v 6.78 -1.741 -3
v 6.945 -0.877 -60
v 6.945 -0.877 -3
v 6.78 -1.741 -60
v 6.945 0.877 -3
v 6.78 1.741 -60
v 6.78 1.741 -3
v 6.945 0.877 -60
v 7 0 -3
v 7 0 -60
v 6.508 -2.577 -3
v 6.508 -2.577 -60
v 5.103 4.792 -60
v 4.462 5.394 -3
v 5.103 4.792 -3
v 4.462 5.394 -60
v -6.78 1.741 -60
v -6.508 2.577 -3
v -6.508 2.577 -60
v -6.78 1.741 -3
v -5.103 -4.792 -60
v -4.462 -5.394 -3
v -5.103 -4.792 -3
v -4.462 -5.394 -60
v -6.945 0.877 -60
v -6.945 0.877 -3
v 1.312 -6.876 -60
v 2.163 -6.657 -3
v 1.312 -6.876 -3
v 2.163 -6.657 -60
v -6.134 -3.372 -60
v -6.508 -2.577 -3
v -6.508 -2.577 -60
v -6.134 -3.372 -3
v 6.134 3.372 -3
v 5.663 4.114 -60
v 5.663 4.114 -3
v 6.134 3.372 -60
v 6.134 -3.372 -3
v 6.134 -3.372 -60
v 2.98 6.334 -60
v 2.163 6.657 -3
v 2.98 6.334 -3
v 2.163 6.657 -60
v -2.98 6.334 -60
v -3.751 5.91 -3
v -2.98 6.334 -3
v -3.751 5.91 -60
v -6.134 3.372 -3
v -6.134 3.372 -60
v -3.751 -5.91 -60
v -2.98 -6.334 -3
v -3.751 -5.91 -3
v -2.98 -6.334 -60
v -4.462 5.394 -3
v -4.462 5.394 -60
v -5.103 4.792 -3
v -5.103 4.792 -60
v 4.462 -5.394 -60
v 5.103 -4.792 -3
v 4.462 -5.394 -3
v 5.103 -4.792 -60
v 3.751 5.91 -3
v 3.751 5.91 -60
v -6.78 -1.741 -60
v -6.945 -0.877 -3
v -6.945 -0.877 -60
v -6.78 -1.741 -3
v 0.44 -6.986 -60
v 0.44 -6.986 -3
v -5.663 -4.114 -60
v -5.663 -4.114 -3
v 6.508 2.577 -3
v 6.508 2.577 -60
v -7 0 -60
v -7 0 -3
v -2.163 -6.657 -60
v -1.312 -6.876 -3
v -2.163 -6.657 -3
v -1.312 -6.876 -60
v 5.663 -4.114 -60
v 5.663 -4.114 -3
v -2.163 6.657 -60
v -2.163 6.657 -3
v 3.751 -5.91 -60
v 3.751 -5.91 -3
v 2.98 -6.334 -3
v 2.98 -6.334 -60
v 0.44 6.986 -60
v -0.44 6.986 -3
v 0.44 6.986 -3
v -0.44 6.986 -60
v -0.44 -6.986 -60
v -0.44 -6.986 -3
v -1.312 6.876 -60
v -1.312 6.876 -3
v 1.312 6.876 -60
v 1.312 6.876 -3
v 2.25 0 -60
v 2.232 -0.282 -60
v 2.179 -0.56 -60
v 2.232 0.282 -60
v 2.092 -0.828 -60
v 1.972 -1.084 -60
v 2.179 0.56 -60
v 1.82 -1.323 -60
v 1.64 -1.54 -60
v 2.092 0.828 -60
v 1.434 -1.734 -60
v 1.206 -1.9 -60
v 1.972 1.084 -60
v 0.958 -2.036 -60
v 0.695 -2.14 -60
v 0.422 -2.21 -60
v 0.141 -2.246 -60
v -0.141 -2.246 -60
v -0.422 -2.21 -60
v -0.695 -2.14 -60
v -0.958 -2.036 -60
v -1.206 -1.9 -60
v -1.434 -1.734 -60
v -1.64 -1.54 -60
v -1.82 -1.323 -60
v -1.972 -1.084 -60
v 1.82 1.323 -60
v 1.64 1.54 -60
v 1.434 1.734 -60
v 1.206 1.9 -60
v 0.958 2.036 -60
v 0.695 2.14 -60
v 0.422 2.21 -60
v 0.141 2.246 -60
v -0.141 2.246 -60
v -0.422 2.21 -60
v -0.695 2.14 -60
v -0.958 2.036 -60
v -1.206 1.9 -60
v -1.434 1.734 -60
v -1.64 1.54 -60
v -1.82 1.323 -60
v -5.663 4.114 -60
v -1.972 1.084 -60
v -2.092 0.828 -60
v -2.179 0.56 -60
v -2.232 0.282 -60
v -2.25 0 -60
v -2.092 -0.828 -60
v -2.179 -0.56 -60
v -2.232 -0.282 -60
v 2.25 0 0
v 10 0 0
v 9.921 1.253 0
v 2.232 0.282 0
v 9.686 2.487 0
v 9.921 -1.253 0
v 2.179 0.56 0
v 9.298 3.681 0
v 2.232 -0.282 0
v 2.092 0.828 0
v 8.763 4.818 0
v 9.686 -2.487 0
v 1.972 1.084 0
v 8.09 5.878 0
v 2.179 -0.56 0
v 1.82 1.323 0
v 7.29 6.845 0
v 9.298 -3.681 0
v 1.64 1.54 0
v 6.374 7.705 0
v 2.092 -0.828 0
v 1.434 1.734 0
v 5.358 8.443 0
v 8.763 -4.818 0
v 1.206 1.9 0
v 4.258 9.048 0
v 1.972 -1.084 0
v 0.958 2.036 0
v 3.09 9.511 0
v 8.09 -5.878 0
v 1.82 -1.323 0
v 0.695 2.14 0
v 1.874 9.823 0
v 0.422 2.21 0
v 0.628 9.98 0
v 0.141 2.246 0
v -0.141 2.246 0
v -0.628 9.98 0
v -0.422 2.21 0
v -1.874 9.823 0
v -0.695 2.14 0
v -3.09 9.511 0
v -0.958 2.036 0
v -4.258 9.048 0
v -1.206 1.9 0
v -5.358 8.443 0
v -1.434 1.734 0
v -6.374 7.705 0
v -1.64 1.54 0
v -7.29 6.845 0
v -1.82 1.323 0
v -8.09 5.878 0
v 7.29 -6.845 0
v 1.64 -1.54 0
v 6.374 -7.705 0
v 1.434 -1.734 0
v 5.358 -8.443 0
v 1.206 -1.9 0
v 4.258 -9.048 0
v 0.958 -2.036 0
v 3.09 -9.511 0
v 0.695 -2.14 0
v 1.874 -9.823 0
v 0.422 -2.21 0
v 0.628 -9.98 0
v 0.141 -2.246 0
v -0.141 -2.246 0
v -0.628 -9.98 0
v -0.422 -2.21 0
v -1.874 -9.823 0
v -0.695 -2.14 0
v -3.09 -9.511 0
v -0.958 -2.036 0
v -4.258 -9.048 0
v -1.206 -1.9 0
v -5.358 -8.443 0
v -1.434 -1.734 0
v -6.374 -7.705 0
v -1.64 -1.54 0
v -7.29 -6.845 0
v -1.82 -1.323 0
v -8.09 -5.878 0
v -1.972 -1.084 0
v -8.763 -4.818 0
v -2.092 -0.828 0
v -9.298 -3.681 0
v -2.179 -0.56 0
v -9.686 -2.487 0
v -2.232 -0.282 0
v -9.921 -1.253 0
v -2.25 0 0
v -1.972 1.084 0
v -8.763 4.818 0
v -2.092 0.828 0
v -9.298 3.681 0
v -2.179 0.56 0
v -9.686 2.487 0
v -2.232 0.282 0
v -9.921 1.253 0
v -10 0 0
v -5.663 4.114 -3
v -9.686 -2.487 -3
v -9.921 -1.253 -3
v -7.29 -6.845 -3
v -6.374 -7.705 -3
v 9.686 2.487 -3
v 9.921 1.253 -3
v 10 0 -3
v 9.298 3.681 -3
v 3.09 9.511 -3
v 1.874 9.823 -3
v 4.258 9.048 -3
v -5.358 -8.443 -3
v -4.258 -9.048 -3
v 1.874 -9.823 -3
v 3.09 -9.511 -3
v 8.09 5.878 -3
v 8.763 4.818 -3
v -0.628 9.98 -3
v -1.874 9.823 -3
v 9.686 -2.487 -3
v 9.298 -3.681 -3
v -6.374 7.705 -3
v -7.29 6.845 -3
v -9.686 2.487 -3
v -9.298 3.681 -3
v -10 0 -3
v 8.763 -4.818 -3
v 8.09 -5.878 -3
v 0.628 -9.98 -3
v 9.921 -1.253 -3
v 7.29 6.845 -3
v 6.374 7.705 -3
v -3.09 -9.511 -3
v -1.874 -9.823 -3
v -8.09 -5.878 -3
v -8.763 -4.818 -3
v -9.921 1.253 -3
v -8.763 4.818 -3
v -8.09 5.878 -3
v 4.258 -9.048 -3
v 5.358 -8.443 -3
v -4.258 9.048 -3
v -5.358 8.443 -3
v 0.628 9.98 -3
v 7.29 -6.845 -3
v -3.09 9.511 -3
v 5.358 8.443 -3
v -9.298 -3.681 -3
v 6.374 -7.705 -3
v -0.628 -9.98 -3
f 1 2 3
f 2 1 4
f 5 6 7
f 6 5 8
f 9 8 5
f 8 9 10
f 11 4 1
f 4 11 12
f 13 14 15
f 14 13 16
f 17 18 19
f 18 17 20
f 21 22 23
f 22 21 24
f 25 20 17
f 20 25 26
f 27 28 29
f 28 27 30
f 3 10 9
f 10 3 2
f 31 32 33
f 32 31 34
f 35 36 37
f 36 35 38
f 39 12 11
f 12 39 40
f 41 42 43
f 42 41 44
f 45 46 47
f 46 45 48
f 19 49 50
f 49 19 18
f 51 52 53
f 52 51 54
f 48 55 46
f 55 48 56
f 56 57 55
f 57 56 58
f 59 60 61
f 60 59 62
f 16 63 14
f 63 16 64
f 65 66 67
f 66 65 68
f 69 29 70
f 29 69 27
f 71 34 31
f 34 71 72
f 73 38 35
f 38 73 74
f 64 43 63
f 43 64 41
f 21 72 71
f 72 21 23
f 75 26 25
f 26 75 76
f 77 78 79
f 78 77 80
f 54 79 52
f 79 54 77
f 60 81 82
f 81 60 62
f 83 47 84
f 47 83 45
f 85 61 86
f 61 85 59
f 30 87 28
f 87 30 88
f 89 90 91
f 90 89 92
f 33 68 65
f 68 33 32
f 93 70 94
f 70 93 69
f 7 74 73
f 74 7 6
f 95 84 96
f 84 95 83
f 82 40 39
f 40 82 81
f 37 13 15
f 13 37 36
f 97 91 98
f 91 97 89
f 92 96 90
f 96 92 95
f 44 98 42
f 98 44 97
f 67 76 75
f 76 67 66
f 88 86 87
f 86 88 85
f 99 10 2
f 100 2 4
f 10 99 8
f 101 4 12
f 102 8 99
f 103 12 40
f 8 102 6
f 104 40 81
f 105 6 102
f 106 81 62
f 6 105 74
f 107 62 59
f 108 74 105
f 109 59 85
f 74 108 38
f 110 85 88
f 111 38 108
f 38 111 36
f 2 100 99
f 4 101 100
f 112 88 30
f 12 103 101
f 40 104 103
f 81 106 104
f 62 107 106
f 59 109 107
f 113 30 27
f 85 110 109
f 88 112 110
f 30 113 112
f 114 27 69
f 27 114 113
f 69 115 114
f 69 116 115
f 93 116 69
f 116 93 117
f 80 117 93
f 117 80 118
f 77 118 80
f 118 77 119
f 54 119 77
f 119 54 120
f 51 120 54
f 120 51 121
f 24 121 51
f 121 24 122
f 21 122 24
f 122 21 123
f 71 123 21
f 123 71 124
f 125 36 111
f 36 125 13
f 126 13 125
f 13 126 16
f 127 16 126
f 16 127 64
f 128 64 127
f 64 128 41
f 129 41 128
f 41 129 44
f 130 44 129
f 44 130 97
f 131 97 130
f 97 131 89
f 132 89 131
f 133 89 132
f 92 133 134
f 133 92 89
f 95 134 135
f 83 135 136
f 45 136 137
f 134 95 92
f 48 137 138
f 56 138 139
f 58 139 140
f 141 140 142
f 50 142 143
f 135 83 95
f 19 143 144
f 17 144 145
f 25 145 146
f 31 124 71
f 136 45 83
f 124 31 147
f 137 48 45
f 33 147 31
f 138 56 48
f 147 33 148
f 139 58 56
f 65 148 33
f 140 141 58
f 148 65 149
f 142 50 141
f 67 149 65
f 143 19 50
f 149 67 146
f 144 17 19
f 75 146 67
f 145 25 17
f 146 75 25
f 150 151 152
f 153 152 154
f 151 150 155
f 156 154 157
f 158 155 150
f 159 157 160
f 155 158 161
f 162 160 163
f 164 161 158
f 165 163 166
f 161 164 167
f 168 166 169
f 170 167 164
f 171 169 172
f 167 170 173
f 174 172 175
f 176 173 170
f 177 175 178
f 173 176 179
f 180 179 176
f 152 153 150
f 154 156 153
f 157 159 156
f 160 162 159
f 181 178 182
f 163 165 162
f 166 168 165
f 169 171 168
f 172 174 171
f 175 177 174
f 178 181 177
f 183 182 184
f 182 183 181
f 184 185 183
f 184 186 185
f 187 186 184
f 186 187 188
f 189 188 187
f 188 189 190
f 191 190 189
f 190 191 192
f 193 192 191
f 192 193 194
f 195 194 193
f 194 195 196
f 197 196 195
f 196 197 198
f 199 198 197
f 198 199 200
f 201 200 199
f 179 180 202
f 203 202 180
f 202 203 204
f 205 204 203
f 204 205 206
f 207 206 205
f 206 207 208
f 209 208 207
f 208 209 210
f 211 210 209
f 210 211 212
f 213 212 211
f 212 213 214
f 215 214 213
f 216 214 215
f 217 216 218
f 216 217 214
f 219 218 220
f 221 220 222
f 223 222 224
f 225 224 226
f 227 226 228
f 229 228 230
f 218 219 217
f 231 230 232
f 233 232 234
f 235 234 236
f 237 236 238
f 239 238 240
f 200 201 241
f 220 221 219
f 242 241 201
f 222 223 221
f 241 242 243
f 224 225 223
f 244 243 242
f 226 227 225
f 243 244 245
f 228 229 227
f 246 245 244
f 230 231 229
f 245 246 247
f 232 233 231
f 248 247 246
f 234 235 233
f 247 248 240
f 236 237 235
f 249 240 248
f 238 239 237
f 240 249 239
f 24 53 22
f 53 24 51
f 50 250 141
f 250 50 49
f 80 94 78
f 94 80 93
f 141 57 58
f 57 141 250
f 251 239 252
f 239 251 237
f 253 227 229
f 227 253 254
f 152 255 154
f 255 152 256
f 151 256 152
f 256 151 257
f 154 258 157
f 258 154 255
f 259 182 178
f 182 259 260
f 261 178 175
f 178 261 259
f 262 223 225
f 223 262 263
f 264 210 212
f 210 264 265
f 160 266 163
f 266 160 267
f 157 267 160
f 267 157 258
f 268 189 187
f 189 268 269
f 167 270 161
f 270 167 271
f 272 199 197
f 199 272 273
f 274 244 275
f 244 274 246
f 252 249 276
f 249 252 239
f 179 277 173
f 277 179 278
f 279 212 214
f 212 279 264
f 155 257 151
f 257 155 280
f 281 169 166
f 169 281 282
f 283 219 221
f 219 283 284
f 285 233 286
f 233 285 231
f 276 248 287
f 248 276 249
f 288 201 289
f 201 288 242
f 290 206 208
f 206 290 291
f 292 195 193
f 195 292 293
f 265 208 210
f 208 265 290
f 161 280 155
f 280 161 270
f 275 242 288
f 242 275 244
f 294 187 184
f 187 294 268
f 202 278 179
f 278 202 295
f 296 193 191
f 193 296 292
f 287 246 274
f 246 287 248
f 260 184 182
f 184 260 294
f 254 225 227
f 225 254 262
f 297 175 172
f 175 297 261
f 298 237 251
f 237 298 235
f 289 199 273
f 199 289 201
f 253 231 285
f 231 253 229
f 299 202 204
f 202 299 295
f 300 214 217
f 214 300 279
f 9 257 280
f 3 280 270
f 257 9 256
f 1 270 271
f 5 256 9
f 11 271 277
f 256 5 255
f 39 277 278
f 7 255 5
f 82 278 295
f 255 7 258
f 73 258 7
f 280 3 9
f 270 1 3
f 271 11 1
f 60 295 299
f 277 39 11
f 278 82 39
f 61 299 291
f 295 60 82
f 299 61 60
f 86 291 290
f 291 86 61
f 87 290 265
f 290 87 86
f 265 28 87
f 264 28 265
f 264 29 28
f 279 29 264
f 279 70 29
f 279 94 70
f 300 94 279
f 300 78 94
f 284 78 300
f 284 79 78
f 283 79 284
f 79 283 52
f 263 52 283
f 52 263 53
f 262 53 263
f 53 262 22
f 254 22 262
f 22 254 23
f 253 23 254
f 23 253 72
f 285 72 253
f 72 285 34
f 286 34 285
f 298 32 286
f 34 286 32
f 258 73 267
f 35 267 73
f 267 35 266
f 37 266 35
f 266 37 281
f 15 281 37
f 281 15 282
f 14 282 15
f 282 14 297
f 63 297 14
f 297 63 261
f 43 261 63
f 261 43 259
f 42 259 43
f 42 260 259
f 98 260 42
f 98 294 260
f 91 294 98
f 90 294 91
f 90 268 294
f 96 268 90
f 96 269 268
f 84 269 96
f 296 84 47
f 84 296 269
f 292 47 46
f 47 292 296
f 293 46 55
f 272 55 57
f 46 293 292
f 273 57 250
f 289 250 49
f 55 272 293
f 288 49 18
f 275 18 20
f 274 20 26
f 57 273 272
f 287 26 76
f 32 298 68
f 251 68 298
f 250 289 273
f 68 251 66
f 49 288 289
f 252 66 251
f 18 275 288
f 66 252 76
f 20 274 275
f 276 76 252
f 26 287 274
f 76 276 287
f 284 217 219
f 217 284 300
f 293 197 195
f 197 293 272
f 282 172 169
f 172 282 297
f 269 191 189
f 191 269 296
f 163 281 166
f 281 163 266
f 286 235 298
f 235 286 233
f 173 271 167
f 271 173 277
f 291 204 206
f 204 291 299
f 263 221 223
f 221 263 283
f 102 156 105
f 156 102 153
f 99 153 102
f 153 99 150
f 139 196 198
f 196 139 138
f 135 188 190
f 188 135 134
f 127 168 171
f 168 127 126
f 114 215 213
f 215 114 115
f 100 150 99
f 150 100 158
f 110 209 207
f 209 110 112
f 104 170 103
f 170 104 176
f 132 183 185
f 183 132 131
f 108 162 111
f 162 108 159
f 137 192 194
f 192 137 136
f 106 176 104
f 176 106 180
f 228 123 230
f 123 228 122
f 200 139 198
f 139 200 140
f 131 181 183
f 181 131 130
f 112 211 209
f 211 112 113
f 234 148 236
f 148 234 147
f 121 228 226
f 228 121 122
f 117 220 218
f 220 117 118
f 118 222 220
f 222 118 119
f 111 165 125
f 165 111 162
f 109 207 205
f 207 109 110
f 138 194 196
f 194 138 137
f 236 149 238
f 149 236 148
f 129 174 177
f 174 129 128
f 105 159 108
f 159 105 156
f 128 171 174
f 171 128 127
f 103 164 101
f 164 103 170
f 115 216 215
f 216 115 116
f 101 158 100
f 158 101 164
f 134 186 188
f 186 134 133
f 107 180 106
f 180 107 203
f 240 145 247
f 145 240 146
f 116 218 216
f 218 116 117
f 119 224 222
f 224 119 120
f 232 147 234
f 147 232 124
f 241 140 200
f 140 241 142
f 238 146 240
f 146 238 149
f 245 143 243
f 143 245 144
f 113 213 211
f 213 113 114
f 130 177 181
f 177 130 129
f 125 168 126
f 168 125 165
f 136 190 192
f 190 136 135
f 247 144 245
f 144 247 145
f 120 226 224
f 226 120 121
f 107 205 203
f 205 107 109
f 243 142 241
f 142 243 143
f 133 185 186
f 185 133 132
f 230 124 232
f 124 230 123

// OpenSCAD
$fn = 50;


difference() {
	union() {
		translate(v = [0, 0, -60.0000000000]) {
			cylinder(h = 60, r = 7.0000000000);
		}
		translate(v = [0, 0, -3.0000000000]) {
			cylinder(h = 3, r = 10.0000000000);
		}
	}
	union() {
		#translate(v = [0, 0, -60]) {
			cylinder(h = 60, r = 2.2500000000);
		}
	}
}
